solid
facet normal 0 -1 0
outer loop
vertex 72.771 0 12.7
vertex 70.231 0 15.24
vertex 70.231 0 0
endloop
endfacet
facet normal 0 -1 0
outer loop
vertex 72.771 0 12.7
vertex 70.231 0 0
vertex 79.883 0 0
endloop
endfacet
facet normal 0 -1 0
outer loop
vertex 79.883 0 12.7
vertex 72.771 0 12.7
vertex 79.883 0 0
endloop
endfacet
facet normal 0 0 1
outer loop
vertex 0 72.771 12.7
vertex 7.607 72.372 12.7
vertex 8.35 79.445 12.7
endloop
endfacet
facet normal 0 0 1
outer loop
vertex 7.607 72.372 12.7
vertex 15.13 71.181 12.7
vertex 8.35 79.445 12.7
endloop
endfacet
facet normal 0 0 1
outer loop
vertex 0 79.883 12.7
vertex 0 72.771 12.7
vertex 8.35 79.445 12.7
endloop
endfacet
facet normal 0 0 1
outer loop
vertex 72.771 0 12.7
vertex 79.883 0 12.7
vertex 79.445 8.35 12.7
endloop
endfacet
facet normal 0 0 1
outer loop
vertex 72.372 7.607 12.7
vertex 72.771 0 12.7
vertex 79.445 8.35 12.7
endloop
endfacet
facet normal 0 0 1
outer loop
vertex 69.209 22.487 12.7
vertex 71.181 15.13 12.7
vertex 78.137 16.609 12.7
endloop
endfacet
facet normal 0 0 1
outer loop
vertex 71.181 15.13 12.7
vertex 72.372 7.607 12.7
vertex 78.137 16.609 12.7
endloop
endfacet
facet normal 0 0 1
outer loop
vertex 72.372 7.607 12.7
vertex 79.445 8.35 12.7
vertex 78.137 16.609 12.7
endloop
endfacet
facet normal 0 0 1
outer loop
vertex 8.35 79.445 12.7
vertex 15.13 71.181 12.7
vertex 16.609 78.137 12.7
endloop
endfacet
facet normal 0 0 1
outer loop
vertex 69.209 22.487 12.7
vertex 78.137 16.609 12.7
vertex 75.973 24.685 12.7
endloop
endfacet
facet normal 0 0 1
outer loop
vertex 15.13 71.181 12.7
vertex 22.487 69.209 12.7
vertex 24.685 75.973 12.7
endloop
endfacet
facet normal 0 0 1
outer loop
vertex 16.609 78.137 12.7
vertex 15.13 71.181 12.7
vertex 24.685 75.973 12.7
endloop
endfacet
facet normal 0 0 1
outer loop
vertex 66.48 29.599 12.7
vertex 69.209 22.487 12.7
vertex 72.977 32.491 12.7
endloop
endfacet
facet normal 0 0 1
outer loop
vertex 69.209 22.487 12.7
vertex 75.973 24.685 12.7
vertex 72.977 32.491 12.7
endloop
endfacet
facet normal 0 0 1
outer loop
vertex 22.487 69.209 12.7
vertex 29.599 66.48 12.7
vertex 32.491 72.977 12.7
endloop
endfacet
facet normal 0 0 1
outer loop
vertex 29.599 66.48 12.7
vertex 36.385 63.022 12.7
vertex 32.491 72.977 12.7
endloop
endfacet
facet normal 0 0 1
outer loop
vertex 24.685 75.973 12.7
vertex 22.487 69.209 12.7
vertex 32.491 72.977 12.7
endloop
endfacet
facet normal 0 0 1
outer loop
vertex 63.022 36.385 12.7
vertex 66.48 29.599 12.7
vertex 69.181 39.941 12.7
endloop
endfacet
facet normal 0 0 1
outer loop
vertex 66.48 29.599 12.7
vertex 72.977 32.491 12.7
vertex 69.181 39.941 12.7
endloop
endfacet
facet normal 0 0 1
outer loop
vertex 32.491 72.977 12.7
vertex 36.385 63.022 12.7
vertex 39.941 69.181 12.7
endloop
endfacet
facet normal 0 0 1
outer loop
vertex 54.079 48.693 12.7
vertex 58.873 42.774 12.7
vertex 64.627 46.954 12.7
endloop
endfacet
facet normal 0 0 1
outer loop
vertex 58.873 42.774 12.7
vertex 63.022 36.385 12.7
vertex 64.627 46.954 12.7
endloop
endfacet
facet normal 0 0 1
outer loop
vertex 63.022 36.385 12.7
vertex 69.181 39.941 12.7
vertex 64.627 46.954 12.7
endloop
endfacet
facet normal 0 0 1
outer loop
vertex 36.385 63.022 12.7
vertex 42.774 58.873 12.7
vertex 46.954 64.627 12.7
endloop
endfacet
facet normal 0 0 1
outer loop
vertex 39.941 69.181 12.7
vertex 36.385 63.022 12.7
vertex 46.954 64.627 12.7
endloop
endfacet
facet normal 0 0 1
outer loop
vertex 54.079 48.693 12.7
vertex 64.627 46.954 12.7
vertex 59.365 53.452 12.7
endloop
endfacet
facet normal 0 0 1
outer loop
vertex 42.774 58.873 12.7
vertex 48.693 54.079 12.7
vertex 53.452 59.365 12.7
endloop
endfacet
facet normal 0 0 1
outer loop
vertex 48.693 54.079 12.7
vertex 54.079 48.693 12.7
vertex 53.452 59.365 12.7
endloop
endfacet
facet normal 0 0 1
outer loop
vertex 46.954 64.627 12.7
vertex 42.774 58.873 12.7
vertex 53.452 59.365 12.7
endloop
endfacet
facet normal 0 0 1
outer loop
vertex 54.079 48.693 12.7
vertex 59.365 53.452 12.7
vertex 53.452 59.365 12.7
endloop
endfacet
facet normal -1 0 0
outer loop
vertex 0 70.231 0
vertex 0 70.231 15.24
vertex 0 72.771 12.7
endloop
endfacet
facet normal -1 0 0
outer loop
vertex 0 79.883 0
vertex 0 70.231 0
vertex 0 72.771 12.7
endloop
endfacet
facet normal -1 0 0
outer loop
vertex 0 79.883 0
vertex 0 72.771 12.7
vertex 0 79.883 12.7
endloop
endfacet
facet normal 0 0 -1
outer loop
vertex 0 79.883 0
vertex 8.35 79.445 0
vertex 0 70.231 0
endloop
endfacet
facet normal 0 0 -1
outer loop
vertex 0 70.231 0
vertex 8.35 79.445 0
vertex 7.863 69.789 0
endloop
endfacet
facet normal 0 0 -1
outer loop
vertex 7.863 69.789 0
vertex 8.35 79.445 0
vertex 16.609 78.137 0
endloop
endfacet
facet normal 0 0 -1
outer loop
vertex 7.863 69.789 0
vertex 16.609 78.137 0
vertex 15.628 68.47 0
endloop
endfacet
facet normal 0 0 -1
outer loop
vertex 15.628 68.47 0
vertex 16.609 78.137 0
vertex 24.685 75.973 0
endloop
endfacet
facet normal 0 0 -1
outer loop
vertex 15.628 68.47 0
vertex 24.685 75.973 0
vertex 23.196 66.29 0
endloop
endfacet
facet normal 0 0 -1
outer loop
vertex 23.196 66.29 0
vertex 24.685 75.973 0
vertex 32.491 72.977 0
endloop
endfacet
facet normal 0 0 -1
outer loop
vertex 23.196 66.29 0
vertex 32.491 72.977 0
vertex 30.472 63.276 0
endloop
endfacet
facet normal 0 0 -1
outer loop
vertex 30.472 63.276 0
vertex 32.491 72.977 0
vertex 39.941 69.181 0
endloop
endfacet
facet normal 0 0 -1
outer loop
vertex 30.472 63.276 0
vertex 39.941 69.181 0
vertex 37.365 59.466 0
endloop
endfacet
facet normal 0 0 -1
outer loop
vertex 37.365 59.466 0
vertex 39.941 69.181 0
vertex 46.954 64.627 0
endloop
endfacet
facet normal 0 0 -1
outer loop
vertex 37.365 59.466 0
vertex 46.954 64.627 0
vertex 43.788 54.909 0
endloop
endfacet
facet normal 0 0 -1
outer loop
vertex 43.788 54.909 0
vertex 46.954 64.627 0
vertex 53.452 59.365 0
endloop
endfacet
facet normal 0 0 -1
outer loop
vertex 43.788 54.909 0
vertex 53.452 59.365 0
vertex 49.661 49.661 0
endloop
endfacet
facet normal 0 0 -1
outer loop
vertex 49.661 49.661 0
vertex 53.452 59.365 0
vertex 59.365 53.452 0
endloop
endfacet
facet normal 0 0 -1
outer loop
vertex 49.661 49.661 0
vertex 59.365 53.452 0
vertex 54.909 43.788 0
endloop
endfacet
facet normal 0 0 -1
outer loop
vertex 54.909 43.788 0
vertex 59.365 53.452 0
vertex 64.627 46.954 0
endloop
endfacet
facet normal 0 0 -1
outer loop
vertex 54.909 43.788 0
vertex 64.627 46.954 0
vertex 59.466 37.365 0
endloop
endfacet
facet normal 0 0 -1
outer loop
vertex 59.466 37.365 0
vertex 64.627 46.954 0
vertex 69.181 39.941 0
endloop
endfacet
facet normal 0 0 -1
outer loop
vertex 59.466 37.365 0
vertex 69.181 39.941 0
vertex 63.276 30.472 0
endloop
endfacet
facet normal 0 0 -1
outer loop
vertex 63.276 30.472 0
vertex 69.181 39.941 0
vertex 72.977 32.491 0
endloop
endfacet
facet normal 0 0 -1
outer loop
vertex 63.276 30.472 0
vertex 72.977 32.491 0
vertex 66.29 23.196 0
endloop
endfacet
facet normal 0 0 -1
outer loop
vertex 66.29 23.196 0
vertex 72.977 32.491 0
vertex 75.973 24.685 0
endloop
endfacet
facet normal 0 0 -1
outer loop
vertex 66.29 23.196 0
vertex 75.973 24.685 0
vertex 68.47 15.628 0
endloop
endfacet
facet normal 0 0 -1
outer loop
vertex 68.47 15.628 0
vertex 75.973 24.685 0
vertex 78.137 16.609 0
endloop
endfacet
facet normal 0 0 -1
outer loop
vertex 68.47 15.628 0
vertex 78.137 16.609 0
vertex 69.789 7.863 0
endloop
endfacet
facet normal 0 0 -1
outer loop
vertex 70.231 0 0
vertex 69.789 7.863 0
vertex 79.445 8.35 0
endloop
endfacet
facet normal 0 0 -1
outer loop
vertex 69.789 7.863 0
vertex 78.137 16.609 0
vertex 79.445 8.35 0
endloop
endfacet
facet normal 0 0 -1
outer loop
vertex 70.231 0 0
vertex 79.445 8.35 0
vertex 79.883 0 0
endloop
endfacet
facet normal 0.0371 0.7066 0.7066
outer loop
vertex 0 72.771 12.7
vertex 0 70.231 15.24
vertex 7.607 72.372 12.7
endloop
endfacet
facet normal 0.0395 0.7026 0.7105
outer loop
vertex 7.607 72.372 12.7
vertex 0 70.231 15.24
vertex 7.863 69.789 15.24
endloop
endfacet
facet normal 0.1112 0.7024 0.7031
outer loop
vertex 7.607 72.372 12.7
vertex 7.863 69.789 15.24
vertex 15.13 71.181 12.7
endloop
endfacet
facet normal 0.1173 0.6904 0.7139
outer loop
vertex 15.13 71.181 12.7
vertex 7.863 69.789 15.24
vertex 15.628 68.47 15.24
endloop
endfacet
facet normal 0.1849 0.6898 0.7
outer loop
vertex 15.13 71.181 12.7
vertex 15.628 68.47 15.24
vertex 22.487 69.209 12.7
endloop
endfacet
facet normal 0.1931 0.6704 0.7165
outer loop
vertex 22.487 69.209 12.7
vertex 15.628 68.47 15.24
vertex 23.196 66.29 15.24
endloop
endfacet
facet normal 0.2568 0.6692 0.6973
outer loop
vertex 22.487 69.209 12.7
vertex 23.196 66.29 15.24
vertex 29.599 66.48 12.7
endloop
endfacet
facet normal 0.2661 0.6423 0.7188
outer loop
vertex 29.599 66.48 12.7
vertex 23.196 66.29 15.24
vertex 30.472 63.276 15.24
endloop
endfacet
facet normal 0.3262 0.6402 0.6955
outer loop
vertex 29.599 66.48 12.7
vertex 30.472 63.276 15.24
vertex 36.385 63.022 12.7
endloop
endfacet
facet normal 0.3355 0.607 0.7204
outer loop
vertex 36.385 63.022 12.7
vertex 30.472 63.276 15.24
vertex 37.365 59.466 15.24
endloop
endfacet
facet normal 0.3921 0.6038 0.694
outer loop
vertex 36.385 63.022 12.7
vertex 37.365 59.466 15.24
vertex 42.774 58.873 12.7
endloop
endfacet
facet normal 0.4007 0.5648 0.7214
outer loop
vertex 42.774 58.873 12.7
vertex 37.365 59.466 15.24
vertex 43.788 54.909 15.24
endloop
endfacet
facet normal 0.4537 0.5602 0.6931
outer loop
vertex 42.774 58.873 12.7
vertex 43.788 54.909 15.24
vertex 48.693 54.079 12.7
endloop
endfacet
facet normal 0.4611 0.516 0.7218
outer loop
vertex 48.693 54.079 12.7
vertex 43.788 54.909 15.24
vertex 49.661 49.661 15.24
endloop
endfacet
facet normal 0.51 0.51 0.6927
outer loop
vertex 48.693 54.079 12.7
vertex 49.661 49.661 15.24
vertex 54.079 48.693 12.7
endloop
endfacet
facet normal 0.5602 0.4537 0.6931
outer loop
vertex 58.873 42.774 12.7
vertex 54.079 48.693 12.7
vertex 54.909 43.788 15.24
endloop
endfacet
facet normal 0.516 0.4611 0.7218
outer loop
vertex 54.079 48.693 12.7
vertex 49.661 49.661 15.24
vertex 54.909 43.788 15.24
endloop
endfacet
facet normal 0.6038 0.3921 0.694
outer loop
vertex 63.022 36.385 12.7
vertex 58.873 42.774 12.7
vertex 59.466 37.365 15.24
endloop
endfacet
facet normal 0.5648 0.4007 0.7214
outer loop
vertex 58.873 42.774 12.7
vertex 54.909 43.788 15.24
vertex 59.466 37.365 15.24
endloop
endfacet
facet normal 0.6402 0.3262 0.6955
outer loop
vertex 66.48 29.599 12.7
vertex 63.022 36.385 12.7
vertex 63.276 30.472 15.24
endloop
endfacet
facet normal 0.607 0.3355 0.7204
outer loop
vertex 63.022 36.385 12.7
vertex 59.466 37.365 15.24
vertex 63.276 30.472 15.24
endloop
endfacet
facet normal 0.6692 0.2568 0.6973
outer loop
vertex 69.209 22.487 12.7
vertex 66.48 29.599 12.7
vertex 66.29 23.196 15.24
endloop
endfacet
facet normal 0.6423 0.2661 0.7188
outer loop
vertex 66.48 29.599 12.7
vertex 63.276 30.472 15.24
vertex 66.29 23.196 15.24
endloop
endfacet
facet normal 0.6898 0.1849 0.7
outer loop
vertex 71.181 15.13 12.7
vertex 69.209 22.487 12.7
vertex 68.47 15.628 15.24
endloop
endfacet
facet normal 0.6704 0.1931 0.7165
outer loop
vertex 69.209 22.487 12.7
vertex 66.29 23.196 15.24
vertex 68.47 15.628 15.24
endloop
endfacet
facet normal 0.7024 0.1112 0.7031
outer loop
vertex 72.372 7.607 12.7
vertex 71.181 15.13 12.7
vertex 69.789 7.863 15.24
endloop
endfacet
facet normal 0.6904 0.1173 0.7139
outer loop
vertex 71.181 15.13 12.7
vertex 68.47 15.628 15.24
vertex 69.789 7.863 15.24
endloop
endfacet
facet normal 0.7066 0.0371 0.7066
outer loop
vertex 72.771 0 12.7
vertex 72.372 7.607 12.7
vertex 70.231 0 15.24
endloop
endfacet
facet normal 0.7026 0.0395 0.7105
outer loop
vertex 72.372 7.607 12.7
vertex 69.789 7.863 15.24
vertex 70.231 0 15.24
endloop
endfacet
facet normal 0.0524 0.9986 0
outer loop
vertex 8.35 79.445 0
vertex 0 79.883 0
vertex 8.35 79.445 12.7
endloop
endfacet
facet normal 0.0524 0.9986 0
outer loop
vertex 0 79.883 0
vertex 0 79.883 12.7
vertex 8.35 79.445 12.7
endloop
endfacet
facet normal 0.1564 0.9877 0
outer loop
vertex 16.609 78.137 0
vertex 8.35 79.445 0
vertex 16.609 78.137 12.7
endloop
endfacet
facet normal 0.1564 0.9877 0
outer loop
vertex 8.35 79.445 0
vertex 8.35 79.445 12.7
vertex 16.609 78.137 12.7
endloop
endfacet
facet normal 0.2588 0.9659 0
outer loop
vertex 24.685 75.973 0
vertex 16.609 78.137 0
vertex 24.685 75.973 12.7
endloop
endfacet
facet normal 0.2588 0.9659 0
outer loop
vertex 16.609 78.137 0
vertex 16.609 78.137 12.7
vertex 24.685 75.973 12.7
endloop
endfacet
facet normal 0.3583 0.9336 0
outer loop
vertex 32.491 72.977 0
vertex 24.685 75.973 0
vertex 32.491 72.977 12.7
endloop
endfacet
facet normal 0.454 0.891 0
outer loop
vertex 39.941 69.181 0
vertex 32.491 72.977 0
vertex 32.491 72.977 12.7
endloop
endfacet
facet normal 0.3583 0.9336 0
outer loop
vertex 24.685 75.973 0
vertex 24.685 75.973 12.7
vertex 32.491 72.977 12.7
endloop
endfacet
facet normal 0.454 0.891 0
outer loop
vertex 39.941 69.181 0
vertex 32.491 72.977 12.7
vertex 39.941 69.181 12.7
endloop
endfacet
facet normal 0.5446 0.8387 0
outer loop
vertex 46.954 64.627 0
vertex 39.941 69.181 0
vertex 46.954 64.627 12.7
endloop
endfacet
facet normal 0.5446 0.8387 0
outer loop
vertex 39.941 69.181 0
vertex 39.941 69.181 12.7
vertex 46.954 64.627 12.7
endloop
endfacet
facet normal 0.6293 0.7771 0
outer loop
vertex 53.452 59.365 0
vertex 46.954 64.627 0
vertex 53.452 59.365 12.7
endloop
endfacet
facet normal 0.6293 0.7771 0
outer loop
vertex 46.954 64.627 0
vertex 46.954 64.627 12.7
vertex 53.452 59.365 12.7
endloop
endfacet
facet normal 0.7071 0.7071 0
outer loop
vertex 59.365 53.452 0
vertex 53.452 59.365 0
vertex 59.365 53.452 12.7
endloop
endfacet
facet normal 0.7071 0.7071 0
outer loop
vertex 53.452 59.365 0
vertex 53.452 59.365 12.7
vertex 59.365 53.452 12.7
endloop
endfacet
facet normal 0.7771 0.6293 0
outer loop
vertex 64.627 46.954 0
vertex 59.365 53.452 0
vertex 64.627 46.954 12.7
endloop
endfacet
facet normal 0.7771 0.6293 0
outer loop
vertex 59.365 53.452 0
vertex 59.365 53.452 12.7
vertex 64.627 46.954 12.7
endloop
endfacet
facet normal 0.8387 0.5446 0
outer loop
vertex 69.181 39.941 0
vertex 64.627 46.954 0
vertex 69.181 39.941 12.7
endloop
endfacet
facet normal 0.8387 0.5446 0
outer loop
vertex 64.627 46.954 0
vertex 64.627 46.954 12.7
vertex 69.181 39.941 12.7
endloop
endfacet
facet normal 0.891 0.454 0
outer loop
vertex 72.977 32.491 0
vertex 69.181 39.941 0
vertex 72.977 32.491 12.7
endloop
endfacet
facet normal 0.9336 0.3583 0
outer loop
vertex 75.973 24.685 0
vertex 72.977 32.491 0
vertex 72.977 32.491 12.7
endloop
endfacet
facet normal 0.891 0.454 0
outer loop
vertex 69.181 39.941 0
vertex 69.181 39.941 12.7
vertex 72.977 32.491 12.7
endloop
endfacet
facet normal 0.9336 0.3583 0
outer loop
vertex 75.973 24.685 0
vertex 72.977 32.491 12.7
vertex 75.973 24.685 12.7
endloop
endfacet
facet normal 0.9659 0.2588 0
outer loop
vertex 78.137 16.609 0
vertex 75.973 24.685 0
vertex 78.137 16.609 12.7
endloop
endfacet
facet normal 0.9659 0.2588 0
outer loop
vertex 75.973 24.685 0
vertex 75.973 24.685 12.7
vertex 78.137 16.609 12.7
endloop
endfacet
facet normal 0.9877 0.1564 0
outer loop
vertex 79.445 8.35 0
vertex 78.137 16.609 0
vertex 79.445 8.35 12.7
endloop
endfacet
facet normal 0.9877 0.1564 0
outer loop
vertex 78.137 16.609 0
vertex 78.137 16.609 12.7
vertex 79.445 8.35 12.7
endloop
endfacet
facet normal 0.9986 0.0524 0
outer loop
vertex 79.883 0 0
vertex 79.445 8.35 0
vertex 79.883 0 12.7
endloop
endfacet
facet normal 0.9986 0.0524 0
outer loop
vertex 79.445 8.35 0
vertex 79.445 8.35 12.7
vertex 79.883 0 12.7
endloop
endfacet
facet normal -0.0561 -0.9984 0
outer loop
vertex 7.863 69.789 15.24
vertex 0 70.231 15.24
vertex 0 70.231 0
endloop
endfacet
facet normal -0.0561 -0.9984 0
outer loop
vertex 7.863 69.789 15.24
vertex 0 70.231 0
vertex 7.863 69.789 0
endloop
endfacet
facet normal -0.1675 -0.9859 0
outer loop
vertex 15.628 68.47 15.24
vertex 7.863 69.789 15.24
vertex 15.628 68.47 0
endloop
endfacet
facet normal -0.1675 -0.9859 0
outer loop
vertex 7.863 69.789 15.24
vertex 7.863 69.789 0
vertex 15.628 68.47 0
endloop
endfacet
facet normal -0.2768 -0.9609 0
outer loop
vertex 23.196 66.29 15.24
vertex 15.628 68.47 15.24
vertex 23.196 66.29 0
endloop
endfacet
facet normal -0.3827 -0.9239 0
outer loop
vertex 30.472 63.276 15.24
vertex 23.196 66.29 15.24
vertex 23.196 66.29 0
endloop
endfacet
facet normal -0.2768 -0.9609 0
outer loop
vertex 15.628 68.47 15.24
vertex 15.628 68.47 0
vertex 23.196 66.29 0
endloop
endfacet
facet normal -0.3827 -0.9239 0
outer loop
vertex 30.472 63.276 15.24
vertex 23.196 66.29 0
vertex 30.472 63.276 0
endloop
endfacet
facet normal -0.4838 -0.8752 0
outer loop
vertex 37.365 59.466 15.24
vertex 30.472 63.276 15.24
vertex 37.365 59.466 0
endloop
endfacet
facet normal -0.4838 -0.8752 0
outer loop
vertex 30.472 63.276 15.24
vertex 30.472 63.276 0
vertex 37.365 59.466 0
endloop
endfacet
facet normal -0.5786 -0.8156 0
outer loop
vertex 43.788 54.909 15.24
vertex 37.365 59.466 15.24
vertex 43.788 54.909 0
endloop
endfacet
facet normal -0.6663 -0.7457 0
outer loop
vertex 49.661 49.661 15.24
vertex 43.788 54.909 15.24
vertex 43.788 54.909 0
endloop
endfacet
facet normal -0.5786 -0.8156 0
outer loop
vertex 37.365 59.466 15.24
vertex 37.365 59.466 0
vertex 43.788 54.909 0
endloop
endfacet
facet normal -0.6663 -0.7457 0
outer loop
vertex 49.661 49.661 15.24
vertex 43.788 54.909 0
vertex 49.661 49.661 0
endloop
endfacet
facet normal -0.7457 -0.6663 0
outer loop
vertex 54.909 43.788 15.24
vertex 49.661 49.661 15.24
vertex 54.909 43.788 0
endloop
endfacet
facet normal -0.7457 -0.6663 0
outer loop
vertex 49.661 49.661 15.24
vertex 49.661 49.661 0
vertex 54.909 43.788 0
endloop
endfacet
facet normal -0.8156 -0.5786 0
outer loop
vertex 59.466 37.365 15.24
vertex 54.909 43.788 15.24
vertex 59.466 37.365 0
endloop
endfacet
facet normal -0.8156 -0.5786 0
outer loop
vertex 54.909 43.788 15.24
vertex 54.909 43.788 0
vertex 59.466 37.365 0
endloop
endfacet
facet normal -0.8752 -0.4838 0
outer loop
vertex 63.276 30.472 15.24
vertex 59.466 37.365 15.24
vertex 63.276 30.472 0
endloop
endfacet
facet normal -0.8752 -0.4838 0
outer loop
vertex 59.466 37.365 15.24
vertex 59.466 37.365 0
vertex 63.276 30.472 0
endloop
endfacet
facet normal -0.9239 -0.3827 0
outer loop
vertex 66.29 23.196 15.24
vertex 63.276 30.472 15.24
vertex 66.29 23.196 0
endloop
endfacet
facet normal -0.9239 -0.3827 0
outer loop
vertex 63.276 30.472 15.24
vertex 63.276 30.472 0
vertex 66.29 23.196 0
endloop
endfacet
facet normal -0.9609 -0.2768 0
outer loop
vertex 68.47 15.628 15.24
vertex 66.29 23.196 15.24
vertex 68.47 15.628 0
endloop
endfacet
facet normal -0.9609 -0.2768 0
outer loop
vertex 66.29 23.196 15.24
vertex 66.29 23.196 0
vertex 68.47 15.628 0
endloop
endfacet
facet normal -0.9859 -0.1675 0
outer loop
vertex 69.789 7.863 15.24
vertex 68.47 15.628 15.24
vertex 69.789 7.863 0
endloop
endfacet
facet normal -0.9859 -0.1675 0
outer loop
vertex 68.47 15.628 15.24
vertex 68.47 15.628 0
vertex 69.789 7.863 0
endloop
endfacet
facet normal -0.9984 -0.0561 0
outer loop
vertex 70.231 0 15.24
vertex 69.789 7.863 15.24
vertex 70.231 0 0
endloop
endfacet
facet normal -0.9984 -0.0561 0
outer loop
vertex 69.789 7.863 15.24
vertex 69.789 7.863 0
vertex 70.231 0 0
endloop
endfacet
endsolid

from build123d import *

# Parameters (mm, degrees)
F1_ANGLE = 90


with BuildPart() as f1:
    # F0 (on Right) → F1 (revolve)
    with BuildSketch(Plane.YZ):
        Polygon((70.231, 15.24), (70.231, 0), (79.883, 0), (79.883, 12.7), (72.771, 12.7), align=None)
    revolve(axis=Axis((0, 0, 5.783735), (0, 0, -1)), revolution_arc=F1_ANGLE)


solid = f1.part
